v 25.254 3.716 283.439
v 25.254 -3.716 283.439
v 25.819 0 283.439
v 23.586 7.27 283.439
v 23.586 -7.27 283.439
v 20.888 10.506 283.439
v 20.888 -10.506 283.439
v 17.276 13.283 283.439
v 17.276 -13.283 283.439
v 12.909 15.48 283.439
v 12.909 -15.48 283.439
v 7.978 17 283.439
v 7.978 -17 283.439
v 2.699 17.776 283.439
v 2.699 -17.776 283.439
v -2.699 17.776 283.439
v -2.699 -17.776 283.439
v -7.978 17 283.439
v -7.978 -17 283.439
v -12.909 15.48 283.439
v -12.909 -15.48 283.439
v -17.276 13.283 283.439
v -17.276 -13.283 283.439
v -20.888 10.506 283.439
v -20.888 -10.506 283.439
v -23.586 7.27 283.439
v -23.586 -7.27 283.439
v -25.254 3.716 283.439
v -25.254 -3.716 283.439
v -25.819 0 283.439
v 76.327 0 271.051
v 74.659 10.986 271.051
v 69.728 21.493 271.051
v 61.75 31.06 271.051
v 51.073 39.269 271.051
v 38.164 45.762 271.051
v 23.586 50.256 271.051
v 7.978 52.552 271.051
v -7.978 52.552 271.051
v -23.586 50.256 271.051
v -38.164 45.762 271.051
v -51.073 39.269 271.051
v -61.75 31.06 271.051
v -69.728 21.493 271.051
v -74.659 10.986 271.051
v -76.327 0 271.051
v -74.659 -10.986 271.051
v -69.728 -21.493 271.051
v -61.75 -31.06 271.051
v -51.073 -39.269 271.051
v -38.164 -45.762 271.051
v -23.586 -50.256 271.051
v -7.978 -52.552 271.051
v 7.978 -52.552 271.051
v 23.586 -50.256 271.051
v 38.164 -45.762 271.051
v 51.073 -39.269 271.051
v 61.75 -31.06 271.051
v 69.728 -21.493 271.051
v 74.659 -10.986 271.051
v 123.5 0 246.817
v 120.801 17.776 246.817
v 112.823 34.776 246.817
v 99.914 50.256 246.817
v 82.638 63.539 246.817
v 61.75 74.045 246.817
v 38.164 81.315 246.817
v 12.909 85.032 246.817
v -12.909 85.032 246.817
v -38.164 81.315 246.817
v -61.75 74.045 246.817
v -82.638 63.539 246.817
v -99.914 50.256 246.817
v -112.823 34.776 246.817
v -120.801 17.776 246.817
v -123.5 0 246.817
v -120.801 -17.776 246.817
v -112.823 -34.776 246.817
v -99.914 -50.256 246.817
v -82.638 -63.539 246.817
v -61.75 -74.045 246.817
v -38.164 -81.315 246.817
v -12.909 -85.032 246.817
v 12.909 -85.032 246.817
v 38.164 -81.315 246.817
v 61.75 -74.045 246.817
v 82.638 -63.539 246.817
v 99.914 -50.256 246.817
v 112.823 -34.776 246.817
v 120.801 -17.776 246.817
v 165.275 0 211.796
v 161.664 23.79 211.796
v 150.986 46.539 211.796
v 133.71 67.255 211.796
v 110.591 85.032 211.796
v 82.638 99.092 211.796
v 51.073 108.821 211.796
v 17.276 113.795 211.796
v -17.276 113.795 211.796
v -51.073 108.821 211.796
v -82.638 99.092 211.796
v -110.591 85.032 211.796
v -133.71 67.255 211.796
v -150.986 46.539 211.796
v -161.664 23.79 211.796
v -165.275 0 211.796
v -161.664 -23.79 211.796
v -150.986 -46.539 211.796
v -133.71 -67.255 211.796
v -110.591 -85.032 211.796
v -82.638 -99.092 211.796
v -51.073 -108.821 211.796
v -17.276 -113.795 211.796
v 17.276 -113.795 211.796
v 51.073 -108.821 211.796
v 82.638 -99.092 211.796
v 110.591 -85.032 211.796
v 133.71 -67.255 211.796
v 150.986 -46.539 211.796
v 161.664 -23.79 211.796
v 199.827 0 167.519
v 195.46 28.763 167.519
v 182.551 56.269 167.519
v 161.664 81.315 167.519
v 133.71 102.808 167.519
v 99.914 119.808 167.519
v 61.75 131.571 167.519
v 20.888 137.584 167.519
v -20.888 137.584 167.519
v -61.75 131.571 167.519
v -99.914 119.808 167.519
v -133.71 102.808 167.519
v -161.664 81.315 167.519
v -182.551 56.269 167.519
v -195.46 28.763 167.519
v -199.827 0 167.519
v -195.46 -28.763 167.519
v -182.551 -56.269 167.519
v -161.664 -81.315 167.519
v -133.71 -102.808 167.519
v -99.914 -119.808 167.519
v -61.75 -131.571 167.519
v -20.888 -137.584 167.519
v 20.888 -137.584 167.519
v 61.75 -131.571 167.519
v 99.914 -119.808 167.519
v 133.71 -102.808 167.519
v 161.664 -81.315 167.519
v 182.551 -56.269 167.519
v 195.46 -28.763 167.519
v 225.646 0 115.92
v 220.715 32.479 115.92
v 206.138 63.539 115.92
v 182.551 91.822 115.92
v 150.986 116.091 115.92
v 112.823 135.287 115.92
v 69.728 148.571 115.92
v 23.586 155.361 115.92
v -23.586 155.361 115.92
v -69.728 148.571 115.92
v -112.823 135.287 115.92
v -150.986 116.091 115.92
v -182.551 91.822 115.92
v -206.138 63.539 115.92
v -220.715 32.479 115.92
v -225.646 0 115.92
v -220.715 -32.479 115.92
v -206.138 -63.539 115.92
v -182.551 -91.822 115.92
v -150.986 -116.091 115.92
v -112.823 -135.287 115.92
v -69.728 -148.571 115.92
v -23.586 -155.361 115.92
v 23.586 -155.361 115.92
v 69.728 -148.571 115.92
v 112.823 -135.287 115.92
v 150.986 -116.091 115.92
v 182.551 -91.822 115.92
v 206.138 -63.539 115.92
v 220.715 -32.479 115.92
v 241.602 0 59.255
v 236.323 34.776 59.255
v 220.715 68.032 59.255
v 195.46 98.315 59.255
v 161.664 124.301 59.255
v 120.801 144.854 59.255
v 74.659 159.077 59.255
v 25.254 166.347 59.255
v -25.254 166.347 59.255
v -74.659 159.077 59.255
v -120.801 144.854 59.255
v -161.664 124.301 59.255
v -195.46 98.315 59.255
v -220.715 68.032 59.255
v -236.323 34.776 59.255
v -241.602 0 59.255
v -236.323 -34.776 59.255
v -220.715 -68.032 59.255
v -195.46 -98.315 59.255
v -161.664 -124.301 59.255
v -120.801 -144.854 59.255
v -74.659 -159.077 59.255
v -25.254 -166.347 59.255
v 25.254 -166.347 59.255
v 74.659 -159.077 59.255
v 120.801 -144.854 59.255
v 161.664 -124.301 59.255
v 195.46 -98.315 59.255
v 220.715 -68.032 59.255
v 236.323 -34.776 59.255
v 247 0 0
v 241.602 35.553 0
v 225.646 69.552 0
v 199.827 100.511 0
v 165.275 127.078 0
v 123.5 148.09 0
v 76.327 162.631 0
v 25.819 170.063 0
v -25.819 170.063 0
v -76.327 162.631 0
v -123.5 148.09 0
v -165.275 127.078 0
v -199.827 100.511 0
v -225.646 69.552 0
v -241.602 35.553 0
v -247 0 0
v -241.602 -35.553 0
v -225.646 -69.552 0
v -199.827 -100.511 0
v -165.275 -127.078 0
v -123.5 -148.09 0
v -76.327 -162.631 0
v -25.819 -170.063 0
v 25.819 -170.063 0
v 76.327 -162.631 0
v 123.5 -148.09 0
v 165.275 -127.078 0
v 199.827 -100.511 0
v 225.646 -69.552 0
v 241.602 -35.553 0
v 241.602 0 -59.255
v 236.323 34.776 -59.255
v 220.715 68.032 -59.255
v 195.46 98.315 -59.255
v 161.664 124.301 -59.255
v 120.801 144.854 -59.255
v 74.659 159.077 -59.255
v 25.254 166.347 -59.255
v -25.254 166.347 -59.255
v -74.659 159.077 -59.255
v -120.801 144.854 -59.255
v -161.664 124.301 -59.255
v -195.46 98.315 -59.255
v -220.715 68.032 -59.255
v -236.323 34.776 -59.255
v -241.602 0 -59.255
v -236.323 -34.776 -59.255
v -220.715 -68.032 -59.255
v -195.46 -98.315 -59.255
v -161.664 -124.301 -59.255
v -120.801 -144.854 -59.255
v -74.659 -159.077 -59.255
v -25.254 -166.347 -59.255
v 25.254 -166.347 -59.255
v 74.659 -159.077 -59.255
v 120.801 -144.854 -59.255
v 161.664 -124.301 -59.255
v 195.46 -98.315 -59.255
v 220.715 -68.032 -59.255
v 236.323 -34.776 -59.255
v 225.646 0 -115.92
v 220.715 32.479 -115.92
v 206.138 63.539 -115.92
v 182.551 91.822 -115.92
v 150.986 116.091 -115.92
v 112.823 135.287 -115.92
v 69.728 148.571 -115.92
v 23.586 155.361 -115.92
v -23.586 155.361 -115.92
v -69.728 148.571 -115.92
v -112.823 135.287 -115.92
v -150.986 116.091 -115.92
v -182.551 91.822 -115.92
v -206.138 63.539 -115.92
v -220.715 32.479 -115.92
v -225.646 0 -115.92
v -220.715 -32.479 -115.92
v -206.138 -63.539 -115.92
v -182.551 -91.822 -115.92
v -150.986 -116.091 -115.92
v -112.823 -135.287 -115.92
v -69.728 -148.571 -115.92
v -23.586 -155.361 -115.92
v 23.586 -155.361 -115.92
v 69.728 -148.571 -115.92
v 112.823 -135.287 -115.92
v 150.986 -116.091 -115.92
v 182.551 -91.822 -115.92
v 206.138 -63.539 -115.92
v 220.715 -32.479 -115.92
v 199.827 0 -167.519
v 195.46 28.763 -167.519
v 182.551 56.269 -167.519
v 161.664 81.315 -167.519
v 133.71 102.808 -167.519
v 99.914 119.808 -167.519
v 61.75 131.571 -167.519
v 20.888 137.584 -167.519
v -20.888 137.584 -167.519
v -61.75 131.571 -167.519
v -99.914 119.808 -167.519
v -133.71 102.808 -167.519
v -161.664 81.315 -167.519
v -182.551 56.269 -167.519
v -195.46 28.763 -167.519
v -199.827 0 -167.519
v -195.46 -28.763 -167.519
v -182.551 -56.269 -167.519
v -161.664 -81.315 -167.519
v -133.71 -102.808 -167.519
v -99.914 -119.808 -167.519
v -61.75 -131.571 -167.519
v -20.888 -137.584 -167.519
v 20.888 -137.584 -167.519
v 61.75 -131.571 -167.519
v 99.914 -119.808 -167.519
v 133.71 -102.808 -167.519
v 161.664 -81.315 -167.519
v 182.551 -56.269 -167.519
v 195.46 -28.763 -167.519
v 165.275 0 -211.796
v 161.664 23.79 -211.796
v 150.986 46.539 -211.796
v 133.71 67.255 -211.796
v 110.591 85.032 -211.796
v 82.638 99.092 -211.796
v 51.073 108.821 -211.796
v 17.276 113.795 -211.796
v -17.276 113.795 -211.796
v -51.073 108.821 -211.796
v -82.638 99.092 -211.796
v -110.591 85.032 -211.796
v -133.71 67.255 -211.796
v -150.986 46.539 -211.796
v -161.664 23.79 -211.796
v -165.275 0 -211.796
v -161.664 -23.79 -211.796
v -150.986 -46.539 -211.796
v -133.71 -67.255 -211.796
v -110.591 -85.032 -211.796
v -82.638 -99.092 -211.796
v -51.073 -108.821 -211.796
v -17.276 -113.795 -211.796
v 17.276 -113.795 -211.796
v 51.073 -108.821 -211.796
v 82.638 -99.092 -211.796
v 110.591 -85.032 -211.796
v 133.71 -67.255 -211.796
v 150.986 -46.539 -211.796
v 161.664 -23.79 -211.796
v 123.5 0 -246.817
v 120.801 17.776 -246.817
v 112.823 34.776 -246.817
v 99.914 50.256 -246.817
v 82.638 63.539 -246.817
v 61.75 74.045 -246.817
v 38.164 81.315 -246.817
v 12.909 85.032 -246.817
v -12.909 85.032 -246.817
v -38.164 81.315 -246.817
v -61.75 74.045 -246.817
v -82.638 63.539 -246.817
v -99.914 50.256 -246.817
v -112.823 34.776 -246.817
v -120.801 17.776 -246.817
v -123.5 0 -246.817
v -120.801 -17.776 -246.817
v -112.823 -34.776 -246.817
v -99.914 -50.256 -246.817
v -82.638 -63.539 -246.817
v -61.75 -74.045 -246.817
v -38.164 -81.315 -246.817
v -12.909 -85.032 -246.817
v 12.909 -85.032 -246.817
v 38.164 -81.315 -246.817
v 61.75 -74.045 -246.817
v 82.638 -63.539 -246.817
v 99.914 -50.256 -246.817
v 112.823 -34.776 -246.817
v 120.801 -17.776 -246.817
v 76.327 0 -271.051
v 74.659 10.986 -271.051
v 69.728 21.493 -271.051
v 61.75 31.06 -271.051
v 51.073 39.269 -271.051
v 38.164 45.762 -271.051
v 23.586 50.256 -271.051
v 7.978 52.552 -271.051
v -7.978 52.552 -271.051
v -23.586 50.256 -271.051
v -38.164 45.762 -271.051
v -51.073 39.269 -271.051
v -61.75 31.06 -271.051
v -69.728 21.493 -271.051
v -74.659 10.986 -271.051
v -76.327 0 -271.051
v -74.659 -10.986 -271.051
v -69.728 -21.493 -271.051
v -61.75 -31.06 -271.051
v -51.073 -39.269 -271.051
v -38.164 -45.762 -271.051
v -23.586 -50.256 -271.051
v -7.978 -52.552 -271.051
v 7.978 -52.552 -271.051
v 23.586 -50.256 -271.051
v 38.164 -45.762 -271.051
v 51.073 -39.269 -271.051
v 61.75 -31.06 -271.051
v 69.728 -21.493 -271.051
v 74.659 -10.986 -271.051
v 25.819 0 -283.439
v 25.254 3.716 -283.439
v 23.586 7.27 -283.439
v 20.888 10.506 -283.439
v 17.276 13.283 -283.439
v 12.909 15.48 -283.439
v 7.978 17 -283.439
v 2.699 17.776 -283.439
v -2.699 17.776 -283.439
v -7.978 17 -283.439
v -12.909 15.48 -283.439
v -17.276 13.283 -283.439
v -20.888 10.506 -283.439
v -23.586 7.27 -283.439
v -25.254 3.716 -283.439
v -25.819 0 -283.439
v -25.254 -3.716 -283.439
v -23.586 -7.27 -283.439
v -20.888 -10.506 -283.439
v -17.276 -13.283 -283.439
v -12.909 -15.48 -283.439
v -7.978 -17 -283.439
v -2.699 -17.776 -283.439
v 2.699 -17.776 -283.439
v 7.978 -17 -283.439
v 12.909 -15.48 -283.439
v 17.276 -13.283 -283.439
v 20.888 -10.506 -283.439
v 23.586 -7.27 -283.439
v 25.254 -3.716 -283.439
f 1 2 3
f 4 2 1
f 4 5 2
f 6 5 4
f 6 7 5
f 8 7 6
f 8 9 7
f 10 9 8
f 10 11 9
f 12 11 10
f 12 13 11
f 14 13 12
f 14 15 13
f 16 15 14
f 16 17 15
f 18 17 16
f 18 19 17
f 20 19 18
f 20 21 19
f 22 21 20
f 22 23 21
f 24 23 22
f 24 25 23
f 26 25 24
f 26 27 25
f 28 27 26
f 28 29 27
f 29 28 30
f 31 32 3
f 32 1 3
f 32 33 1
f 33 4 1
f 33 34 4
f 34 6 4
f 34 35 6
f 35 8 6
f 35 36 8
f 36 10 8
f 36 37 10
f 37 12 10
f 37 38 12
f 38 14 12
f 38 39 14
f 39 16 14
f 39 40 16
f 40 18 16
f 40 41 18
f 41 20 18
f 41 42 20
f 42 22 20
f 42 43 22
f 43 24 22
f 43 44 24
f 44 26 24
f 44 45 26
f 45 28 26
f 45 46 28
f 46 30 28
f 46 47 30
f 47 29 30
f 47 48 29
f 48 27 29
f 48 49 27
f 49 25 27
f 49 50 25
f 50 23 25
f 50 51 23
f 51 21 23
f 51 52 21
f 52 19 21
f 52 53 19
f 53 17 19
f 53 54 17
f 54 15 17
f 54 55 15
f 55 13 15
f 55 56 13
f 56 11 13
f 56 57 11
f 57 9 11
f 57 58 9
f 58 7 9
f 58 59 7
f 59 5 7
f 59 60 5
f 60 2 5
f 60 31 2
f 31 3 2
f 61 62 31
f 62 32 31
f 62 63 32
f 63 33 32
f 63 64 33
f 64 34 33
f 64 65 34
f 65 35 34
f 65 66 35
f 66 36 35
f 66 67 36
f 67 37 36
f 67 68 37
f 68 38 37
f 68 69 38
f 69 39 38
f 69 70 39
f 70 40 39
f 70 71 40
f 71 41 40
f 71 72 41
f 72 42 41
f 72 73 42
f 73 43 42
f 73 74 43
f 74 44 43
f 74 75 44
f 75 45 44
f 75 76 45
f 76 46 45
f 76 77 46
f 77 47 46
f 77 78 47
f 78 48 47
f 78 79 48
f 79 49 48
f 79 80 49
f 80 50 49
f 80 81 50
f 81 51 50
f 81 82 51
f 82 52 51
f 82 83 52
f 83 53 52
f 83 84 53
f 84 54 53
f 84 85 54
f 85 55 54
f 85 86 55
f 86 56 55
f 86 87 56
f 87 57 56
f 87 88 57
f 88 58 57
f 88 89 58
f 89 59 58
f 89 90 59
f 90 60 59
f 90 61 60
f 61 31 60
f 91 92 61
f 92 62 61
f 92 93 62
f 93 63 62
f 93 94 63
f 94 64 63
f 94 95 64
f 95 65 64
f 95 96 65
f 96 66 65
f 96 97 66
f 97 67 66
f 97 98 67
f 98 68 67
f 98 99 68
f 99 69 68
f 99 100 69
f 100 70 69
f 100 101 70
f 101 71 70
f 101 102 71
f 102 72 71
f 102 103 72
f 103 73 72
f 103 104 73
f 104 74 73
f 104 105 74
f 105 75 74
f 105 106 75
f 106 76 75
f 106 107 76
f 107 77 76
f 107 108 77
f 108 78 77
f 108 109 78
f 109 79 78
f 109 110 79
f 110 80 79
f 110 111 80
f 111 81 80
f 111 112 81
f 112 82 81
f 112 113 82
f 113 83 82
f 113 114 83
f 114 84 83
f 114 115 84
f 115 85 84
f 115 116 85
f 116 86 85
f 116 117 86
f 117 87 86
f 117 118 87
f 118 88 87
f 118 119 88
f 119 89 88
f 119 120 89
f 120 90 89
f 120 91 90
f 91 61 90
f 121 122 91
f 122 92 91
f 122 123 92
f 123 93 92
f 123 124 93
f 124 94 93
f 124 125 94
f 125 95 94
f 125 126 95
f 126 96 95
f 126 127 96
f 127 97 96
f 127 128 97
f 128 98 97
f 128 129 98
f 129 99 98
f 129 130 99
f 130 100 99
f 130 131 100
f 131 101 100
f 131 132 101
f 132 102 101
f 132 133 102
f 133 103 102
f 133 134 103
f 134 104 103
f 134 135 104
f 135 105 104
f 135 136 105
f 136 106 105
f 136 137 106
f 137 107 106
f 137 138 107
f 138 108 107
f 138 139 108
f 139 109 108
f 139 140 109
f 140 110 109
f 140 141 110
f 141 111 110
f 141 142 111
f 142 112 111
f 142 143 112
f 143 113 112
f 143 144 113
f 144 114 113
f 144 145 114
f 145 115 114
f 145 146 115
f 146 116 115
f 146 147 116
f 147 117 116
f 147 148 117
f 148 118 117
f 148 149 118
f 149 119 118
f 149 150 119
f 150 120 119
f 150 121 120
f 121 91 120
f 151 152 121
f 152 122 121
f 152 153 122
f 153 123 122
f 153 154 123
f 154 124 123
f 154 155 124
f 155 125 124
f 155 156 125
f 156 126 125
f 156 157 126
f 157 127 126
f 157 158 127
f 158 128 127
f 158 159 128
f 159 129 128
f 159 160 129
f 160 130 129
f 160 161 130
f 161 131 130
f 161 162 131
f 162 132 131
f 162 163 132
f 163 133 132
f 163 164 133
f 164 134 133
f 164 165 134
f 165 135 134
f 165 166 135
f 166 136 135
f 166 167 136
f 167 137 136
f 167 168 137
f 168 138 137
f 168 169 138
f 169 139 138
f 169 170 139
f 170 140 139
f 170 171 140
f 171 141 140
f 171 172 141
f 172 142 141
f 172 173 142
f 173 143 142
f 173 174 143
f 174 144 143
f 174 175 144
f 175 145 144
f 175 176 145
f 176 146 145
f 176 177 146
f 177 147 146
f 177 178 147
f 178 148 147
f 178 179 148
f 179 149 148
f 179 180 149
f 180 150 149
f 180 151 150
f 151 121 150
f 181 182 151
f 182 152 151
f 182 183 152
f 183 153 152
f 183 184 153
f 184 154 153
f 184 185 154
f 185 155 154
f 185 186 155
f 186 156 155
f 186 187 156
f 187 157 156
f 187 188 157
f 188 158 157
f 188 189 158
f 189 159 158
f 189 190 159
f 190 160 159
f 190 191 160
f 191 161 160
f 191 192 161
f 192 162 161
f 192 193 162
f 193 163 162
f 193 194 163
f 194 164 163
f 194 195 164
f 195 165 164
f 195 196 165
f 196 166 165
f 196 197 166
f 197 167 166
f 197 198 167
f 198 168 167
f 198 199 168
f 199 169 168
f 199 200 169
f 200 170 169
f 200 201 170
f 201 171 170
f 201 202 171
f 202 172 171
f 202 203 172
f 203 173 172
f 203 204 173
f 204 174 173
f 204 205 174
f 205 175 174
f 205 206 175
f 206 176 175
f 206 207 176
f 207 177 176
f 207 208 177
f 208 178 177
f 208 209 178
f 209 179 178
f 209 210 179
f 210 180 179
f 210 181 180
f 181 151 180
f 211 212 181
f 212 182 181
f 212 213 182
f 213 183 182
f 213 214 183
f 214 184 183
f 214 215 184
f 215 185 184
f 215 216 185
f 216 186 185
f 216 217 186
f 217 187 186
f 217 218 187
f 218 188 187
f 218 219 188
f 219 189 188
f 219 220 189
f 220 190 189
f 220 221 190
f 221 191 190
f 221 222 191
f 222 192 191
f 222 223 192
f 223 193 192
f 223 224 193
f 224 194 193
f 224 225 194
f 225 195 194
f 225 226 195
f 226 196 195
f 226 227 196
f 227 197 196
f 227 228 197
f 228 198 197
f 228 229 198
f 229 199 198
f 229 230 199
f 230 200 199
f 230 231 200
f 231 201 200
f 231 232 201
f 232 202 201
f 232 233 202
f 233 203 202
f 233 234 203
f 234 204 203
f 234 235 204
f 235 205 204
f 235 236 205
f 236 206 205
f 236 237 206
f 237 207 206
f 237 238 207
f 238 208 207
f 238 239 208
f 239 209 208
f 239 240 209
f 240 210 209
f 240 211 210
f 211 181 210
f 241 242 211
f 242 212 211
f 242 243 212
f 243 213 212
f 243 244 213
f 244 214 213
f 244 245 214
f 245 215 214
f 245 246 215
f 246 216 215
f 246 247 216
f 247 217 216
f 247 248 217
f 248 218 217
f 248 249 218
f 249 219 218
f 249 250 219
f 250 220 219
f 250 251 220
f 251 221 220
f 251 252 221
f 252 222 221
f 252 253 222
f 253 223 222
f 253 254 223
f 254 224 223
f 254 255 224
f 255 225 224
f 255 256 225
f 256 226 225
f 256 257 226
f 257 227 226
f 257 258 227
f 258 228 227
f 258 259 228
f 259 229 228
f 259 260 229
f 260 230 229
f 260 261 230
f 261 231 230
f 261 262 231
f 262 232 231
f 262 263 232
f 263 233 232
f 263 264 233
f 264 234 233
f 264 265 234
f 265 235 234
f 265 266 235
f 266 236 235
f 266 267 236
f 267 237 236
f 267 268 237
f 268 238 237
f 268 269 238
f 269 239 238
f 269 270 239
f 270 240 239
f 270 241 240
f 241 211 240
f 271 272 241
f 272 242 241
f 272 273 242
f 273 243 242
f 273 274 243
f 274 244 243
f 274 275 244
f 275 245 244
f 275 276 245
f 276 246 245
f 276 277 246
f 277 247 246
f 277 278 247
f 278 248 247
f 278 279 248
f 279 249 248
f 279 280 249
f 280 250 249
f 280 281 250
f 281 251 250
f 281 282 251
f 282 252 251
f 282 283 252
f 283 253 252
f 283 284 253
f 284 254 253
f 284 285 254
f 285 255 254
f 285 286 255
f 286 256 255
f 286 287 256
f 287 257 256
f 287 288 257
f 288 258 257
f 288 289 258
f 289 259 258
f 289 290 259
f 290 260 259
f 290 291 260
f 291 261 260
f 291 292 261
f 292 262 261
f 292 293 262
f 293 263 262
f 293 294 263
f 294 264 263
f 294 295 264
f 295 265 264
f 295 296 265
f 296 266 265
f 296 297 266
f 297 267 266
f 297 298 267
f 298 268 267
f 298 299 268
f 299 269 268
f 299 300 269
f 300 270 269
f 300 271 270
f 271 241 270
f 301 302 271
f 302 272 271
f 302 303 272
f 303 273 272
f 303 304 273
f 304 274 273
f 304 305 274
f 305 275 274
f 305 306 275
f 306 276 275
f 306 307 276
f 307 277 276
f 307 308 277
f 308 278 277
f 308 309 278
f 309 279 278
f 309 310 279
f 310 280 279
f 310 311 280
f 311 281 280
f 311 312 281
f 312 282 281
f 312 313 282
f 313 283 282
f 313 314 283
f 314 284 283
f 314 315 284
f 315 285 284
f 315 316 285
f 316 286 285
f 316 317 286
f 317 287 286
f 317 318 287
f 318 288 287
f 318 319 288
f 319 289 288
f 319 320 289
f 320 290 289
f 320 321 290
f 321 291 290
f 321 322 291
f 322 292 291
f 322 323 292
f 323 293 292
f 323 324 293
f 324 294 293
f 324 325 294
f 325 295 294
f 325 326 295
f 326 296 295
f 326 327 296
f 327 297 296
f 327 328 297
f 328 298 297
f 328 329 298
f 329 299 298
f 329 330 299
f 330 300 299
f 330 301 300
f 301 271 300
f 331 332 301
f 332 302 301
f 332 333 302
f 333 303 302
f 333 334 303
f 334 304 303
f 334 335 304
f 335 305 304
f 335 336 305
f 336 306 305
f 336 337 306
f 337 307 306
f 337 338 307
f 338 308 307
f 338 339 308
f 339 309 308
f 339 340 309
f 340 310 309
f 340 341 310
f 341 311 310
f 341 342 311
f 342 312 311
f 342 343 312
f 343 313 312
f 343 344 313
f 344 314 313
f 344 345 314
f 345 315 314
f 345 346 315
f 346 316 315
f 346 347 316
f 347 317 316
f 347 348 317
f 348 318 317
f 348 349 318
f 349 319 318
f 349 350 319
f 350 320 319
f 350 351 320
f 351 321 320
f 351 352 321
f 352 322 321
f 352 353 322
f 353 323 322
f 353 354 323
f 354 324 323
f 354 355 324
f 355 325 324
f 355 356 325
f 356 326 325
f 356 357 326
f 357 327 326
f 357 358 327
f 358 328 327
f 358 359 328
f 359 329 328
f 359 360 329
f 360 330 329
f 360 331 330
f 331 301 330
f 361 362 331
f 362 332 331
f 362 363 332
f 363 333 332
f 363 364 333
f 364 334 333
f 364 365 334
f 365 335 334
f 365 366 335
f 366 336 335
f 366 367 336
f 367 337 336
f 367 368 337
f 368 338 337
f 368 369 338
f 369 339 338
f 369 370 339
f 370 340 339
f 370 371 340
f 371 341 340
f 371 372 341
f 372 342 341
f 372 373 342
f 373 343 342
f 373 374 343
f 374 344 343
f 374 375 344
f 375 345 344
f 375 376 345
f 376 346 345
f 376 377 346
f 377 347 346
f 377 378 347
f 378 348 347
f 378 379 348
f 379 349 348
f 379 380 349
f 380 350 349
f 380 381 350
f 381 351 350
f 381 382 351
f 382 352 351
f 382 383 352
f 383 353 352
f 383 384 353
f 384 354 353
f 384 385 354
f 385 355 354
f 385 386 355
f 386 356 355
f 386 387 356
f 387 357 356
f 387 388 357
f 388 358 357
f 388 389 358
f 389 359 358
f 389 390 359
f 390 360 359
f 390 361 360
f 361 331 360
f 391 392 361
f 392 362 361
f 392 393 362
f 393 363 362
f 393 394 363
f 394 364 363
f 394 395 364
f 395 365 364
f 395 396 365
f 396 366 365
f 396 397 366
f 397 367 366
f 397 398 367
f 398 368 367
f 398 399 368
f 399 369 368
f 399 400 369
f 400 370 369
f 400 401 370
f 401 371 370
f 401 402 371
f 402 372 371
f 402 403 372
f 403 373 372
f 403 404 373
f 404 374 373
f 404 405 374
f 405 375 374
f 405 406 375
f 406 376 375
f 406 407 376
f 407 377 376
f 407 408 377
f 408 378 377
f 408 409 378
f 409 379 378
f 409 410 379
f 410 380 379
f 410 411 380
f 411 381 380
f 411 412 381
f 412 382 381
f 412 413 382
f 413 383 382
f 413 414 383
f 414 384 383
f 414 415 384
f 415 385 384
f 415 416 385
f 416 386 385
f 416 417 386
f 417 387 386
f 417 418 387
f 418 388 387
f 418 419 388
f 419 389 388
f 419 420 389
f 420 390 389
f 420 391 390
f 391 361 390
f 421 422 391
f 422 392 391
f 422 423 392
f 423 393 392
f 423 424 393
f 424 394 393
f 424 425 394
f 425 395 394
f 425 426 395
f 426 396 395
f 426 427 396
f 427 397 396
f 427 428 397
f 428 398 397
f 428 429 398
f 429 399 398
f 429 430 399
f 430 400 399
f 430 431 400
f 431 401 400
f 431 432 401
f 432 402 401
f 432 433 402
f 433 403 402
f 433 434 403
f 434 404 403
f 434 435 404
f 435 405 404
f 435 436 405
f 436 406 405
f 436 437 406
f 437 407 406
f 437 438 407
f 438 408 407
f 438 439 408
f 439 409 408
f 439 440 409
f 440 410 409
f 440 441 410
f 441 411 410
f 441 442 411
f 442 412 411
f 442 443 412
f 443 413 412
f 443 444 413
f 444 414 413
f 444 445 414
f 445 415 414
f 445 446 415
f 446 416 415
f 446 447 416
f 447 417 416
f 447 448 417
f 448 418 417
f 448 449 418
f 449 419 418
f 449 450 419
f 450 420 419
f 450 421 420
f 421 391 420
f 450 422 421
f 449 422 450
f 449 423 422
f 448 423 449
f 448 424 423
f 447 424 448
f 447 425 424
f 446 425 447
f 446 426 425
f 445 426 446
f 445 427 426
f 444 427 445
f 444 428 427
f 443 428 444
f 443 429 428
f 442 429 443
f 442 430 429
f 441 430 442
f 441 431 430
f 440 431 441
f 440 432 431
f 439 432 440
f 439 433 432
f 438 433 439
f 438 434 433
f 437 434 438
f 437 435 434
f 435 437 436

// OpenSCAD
// Generated by SolidPython 1.0.1 on 2020-07-29 00:46:50


scale(v = [13, 9, 15]) {
	sphere(r = 19);
}
/***********************************************
*********      SolidPython code:      **********
************************************************
 
# import packages: SolidPython
from solid import *
from solid.utils import *
from itertools import chain, combinations, permutations


class Resize:

    def __init__(self, scad_file):
        self.scad_file = scad_file
        #self.scad_file = import_scad(scad_file)
        # cone/cylinder param:
        self.r1 = 0
        self.r2 = 0
        self.h = 0
        # rectangular prism param:
        self.w = 0
        self.l = 0
        # ellipse param:
        self.r = 0

    # import OpenScad code (file name corresponds to shape)


    # classify shape + parameters
    def assign(self, param1, param2, param3):
        if self.scad_file == 'cone.scad':
            self.r1 = param1
            self.r2 = param2
            self.h = param3
        elif self.scad_file == 'cylinder.scad':
            self.r1 = param1
            self.r2 = param2
            self.h = param3
        elif self.scad_file == 'rectangularPrism.scad':
            self.h = param1
            self.l = param2
            self.w = param3
        else:
            self.r = param1
            self.h = param2

    # resize parameters
    def iterate(self):
        x = range(3, 20, 2)
        i = 1
        if self.scad_file == 'cone.scad':
            tempList = list(permutations(x, 2))
            for temp in tempList:
                param1 = temp[0]
                param2 = temp[1]
                filepath = 'produced_scad_files/' + 'cone' + str(param1) + '_' + str(param2) + '_' + '.scad'
                scad_render_to_file(cylinder(h=param1, r1=param2, r2=0), filepath)

        elif self.scad_file == 'cylinder.scad':
            tempList = list(permutations(x, 3))
            for temp in tempList:
                param1 = temp[0]
                param2 = temp[1]
                filepath = 'produced_scad_files/' + 'cylinder' + str(param1) + '_' + str(param2) + '_' + '.scad'
                scad_render_to_file(cylinder(h=param1, r1=param2, r2=param2), filepath)

        elif self.scad_file == 'rectangularPrism.scad':
            tempList = list(permutations(x, 3))
            for temp in tempList:
                param1 = temp[0]
                param2 = temp[1]
                param3 = temp[2]
                filepath = 'produced_scad_files/' + 'rectangularPrism' + str(param1) + '_' + str(param2) + '_' + str(
                    param3) + '.scad'
                scad_render_to_file(cube(size=(param1, param2, param3)), filepath)

        elif self.scad_file == 'ellipse.scad':
            tempList = list(permutations(x, 4))
            for temp in tempList:
                param1 = temp[0]
                param2 = temp[1]
                param3 = temp[2]
                param4 = temp[3]
                filepath = 'produced_scad_files/' + 'ellipse' + str(param1) + '_' + str(param2) + '_' + str(param3) + '_' + str(param4) + '.scad'
                scad_render_to_file(scale([param1, param2, param3])(sphere(r=param4)), filepath)

    def render_to_scadfile(self):
        scad_render_to_file(scad, 'example.scad') 
 
************************************************/
